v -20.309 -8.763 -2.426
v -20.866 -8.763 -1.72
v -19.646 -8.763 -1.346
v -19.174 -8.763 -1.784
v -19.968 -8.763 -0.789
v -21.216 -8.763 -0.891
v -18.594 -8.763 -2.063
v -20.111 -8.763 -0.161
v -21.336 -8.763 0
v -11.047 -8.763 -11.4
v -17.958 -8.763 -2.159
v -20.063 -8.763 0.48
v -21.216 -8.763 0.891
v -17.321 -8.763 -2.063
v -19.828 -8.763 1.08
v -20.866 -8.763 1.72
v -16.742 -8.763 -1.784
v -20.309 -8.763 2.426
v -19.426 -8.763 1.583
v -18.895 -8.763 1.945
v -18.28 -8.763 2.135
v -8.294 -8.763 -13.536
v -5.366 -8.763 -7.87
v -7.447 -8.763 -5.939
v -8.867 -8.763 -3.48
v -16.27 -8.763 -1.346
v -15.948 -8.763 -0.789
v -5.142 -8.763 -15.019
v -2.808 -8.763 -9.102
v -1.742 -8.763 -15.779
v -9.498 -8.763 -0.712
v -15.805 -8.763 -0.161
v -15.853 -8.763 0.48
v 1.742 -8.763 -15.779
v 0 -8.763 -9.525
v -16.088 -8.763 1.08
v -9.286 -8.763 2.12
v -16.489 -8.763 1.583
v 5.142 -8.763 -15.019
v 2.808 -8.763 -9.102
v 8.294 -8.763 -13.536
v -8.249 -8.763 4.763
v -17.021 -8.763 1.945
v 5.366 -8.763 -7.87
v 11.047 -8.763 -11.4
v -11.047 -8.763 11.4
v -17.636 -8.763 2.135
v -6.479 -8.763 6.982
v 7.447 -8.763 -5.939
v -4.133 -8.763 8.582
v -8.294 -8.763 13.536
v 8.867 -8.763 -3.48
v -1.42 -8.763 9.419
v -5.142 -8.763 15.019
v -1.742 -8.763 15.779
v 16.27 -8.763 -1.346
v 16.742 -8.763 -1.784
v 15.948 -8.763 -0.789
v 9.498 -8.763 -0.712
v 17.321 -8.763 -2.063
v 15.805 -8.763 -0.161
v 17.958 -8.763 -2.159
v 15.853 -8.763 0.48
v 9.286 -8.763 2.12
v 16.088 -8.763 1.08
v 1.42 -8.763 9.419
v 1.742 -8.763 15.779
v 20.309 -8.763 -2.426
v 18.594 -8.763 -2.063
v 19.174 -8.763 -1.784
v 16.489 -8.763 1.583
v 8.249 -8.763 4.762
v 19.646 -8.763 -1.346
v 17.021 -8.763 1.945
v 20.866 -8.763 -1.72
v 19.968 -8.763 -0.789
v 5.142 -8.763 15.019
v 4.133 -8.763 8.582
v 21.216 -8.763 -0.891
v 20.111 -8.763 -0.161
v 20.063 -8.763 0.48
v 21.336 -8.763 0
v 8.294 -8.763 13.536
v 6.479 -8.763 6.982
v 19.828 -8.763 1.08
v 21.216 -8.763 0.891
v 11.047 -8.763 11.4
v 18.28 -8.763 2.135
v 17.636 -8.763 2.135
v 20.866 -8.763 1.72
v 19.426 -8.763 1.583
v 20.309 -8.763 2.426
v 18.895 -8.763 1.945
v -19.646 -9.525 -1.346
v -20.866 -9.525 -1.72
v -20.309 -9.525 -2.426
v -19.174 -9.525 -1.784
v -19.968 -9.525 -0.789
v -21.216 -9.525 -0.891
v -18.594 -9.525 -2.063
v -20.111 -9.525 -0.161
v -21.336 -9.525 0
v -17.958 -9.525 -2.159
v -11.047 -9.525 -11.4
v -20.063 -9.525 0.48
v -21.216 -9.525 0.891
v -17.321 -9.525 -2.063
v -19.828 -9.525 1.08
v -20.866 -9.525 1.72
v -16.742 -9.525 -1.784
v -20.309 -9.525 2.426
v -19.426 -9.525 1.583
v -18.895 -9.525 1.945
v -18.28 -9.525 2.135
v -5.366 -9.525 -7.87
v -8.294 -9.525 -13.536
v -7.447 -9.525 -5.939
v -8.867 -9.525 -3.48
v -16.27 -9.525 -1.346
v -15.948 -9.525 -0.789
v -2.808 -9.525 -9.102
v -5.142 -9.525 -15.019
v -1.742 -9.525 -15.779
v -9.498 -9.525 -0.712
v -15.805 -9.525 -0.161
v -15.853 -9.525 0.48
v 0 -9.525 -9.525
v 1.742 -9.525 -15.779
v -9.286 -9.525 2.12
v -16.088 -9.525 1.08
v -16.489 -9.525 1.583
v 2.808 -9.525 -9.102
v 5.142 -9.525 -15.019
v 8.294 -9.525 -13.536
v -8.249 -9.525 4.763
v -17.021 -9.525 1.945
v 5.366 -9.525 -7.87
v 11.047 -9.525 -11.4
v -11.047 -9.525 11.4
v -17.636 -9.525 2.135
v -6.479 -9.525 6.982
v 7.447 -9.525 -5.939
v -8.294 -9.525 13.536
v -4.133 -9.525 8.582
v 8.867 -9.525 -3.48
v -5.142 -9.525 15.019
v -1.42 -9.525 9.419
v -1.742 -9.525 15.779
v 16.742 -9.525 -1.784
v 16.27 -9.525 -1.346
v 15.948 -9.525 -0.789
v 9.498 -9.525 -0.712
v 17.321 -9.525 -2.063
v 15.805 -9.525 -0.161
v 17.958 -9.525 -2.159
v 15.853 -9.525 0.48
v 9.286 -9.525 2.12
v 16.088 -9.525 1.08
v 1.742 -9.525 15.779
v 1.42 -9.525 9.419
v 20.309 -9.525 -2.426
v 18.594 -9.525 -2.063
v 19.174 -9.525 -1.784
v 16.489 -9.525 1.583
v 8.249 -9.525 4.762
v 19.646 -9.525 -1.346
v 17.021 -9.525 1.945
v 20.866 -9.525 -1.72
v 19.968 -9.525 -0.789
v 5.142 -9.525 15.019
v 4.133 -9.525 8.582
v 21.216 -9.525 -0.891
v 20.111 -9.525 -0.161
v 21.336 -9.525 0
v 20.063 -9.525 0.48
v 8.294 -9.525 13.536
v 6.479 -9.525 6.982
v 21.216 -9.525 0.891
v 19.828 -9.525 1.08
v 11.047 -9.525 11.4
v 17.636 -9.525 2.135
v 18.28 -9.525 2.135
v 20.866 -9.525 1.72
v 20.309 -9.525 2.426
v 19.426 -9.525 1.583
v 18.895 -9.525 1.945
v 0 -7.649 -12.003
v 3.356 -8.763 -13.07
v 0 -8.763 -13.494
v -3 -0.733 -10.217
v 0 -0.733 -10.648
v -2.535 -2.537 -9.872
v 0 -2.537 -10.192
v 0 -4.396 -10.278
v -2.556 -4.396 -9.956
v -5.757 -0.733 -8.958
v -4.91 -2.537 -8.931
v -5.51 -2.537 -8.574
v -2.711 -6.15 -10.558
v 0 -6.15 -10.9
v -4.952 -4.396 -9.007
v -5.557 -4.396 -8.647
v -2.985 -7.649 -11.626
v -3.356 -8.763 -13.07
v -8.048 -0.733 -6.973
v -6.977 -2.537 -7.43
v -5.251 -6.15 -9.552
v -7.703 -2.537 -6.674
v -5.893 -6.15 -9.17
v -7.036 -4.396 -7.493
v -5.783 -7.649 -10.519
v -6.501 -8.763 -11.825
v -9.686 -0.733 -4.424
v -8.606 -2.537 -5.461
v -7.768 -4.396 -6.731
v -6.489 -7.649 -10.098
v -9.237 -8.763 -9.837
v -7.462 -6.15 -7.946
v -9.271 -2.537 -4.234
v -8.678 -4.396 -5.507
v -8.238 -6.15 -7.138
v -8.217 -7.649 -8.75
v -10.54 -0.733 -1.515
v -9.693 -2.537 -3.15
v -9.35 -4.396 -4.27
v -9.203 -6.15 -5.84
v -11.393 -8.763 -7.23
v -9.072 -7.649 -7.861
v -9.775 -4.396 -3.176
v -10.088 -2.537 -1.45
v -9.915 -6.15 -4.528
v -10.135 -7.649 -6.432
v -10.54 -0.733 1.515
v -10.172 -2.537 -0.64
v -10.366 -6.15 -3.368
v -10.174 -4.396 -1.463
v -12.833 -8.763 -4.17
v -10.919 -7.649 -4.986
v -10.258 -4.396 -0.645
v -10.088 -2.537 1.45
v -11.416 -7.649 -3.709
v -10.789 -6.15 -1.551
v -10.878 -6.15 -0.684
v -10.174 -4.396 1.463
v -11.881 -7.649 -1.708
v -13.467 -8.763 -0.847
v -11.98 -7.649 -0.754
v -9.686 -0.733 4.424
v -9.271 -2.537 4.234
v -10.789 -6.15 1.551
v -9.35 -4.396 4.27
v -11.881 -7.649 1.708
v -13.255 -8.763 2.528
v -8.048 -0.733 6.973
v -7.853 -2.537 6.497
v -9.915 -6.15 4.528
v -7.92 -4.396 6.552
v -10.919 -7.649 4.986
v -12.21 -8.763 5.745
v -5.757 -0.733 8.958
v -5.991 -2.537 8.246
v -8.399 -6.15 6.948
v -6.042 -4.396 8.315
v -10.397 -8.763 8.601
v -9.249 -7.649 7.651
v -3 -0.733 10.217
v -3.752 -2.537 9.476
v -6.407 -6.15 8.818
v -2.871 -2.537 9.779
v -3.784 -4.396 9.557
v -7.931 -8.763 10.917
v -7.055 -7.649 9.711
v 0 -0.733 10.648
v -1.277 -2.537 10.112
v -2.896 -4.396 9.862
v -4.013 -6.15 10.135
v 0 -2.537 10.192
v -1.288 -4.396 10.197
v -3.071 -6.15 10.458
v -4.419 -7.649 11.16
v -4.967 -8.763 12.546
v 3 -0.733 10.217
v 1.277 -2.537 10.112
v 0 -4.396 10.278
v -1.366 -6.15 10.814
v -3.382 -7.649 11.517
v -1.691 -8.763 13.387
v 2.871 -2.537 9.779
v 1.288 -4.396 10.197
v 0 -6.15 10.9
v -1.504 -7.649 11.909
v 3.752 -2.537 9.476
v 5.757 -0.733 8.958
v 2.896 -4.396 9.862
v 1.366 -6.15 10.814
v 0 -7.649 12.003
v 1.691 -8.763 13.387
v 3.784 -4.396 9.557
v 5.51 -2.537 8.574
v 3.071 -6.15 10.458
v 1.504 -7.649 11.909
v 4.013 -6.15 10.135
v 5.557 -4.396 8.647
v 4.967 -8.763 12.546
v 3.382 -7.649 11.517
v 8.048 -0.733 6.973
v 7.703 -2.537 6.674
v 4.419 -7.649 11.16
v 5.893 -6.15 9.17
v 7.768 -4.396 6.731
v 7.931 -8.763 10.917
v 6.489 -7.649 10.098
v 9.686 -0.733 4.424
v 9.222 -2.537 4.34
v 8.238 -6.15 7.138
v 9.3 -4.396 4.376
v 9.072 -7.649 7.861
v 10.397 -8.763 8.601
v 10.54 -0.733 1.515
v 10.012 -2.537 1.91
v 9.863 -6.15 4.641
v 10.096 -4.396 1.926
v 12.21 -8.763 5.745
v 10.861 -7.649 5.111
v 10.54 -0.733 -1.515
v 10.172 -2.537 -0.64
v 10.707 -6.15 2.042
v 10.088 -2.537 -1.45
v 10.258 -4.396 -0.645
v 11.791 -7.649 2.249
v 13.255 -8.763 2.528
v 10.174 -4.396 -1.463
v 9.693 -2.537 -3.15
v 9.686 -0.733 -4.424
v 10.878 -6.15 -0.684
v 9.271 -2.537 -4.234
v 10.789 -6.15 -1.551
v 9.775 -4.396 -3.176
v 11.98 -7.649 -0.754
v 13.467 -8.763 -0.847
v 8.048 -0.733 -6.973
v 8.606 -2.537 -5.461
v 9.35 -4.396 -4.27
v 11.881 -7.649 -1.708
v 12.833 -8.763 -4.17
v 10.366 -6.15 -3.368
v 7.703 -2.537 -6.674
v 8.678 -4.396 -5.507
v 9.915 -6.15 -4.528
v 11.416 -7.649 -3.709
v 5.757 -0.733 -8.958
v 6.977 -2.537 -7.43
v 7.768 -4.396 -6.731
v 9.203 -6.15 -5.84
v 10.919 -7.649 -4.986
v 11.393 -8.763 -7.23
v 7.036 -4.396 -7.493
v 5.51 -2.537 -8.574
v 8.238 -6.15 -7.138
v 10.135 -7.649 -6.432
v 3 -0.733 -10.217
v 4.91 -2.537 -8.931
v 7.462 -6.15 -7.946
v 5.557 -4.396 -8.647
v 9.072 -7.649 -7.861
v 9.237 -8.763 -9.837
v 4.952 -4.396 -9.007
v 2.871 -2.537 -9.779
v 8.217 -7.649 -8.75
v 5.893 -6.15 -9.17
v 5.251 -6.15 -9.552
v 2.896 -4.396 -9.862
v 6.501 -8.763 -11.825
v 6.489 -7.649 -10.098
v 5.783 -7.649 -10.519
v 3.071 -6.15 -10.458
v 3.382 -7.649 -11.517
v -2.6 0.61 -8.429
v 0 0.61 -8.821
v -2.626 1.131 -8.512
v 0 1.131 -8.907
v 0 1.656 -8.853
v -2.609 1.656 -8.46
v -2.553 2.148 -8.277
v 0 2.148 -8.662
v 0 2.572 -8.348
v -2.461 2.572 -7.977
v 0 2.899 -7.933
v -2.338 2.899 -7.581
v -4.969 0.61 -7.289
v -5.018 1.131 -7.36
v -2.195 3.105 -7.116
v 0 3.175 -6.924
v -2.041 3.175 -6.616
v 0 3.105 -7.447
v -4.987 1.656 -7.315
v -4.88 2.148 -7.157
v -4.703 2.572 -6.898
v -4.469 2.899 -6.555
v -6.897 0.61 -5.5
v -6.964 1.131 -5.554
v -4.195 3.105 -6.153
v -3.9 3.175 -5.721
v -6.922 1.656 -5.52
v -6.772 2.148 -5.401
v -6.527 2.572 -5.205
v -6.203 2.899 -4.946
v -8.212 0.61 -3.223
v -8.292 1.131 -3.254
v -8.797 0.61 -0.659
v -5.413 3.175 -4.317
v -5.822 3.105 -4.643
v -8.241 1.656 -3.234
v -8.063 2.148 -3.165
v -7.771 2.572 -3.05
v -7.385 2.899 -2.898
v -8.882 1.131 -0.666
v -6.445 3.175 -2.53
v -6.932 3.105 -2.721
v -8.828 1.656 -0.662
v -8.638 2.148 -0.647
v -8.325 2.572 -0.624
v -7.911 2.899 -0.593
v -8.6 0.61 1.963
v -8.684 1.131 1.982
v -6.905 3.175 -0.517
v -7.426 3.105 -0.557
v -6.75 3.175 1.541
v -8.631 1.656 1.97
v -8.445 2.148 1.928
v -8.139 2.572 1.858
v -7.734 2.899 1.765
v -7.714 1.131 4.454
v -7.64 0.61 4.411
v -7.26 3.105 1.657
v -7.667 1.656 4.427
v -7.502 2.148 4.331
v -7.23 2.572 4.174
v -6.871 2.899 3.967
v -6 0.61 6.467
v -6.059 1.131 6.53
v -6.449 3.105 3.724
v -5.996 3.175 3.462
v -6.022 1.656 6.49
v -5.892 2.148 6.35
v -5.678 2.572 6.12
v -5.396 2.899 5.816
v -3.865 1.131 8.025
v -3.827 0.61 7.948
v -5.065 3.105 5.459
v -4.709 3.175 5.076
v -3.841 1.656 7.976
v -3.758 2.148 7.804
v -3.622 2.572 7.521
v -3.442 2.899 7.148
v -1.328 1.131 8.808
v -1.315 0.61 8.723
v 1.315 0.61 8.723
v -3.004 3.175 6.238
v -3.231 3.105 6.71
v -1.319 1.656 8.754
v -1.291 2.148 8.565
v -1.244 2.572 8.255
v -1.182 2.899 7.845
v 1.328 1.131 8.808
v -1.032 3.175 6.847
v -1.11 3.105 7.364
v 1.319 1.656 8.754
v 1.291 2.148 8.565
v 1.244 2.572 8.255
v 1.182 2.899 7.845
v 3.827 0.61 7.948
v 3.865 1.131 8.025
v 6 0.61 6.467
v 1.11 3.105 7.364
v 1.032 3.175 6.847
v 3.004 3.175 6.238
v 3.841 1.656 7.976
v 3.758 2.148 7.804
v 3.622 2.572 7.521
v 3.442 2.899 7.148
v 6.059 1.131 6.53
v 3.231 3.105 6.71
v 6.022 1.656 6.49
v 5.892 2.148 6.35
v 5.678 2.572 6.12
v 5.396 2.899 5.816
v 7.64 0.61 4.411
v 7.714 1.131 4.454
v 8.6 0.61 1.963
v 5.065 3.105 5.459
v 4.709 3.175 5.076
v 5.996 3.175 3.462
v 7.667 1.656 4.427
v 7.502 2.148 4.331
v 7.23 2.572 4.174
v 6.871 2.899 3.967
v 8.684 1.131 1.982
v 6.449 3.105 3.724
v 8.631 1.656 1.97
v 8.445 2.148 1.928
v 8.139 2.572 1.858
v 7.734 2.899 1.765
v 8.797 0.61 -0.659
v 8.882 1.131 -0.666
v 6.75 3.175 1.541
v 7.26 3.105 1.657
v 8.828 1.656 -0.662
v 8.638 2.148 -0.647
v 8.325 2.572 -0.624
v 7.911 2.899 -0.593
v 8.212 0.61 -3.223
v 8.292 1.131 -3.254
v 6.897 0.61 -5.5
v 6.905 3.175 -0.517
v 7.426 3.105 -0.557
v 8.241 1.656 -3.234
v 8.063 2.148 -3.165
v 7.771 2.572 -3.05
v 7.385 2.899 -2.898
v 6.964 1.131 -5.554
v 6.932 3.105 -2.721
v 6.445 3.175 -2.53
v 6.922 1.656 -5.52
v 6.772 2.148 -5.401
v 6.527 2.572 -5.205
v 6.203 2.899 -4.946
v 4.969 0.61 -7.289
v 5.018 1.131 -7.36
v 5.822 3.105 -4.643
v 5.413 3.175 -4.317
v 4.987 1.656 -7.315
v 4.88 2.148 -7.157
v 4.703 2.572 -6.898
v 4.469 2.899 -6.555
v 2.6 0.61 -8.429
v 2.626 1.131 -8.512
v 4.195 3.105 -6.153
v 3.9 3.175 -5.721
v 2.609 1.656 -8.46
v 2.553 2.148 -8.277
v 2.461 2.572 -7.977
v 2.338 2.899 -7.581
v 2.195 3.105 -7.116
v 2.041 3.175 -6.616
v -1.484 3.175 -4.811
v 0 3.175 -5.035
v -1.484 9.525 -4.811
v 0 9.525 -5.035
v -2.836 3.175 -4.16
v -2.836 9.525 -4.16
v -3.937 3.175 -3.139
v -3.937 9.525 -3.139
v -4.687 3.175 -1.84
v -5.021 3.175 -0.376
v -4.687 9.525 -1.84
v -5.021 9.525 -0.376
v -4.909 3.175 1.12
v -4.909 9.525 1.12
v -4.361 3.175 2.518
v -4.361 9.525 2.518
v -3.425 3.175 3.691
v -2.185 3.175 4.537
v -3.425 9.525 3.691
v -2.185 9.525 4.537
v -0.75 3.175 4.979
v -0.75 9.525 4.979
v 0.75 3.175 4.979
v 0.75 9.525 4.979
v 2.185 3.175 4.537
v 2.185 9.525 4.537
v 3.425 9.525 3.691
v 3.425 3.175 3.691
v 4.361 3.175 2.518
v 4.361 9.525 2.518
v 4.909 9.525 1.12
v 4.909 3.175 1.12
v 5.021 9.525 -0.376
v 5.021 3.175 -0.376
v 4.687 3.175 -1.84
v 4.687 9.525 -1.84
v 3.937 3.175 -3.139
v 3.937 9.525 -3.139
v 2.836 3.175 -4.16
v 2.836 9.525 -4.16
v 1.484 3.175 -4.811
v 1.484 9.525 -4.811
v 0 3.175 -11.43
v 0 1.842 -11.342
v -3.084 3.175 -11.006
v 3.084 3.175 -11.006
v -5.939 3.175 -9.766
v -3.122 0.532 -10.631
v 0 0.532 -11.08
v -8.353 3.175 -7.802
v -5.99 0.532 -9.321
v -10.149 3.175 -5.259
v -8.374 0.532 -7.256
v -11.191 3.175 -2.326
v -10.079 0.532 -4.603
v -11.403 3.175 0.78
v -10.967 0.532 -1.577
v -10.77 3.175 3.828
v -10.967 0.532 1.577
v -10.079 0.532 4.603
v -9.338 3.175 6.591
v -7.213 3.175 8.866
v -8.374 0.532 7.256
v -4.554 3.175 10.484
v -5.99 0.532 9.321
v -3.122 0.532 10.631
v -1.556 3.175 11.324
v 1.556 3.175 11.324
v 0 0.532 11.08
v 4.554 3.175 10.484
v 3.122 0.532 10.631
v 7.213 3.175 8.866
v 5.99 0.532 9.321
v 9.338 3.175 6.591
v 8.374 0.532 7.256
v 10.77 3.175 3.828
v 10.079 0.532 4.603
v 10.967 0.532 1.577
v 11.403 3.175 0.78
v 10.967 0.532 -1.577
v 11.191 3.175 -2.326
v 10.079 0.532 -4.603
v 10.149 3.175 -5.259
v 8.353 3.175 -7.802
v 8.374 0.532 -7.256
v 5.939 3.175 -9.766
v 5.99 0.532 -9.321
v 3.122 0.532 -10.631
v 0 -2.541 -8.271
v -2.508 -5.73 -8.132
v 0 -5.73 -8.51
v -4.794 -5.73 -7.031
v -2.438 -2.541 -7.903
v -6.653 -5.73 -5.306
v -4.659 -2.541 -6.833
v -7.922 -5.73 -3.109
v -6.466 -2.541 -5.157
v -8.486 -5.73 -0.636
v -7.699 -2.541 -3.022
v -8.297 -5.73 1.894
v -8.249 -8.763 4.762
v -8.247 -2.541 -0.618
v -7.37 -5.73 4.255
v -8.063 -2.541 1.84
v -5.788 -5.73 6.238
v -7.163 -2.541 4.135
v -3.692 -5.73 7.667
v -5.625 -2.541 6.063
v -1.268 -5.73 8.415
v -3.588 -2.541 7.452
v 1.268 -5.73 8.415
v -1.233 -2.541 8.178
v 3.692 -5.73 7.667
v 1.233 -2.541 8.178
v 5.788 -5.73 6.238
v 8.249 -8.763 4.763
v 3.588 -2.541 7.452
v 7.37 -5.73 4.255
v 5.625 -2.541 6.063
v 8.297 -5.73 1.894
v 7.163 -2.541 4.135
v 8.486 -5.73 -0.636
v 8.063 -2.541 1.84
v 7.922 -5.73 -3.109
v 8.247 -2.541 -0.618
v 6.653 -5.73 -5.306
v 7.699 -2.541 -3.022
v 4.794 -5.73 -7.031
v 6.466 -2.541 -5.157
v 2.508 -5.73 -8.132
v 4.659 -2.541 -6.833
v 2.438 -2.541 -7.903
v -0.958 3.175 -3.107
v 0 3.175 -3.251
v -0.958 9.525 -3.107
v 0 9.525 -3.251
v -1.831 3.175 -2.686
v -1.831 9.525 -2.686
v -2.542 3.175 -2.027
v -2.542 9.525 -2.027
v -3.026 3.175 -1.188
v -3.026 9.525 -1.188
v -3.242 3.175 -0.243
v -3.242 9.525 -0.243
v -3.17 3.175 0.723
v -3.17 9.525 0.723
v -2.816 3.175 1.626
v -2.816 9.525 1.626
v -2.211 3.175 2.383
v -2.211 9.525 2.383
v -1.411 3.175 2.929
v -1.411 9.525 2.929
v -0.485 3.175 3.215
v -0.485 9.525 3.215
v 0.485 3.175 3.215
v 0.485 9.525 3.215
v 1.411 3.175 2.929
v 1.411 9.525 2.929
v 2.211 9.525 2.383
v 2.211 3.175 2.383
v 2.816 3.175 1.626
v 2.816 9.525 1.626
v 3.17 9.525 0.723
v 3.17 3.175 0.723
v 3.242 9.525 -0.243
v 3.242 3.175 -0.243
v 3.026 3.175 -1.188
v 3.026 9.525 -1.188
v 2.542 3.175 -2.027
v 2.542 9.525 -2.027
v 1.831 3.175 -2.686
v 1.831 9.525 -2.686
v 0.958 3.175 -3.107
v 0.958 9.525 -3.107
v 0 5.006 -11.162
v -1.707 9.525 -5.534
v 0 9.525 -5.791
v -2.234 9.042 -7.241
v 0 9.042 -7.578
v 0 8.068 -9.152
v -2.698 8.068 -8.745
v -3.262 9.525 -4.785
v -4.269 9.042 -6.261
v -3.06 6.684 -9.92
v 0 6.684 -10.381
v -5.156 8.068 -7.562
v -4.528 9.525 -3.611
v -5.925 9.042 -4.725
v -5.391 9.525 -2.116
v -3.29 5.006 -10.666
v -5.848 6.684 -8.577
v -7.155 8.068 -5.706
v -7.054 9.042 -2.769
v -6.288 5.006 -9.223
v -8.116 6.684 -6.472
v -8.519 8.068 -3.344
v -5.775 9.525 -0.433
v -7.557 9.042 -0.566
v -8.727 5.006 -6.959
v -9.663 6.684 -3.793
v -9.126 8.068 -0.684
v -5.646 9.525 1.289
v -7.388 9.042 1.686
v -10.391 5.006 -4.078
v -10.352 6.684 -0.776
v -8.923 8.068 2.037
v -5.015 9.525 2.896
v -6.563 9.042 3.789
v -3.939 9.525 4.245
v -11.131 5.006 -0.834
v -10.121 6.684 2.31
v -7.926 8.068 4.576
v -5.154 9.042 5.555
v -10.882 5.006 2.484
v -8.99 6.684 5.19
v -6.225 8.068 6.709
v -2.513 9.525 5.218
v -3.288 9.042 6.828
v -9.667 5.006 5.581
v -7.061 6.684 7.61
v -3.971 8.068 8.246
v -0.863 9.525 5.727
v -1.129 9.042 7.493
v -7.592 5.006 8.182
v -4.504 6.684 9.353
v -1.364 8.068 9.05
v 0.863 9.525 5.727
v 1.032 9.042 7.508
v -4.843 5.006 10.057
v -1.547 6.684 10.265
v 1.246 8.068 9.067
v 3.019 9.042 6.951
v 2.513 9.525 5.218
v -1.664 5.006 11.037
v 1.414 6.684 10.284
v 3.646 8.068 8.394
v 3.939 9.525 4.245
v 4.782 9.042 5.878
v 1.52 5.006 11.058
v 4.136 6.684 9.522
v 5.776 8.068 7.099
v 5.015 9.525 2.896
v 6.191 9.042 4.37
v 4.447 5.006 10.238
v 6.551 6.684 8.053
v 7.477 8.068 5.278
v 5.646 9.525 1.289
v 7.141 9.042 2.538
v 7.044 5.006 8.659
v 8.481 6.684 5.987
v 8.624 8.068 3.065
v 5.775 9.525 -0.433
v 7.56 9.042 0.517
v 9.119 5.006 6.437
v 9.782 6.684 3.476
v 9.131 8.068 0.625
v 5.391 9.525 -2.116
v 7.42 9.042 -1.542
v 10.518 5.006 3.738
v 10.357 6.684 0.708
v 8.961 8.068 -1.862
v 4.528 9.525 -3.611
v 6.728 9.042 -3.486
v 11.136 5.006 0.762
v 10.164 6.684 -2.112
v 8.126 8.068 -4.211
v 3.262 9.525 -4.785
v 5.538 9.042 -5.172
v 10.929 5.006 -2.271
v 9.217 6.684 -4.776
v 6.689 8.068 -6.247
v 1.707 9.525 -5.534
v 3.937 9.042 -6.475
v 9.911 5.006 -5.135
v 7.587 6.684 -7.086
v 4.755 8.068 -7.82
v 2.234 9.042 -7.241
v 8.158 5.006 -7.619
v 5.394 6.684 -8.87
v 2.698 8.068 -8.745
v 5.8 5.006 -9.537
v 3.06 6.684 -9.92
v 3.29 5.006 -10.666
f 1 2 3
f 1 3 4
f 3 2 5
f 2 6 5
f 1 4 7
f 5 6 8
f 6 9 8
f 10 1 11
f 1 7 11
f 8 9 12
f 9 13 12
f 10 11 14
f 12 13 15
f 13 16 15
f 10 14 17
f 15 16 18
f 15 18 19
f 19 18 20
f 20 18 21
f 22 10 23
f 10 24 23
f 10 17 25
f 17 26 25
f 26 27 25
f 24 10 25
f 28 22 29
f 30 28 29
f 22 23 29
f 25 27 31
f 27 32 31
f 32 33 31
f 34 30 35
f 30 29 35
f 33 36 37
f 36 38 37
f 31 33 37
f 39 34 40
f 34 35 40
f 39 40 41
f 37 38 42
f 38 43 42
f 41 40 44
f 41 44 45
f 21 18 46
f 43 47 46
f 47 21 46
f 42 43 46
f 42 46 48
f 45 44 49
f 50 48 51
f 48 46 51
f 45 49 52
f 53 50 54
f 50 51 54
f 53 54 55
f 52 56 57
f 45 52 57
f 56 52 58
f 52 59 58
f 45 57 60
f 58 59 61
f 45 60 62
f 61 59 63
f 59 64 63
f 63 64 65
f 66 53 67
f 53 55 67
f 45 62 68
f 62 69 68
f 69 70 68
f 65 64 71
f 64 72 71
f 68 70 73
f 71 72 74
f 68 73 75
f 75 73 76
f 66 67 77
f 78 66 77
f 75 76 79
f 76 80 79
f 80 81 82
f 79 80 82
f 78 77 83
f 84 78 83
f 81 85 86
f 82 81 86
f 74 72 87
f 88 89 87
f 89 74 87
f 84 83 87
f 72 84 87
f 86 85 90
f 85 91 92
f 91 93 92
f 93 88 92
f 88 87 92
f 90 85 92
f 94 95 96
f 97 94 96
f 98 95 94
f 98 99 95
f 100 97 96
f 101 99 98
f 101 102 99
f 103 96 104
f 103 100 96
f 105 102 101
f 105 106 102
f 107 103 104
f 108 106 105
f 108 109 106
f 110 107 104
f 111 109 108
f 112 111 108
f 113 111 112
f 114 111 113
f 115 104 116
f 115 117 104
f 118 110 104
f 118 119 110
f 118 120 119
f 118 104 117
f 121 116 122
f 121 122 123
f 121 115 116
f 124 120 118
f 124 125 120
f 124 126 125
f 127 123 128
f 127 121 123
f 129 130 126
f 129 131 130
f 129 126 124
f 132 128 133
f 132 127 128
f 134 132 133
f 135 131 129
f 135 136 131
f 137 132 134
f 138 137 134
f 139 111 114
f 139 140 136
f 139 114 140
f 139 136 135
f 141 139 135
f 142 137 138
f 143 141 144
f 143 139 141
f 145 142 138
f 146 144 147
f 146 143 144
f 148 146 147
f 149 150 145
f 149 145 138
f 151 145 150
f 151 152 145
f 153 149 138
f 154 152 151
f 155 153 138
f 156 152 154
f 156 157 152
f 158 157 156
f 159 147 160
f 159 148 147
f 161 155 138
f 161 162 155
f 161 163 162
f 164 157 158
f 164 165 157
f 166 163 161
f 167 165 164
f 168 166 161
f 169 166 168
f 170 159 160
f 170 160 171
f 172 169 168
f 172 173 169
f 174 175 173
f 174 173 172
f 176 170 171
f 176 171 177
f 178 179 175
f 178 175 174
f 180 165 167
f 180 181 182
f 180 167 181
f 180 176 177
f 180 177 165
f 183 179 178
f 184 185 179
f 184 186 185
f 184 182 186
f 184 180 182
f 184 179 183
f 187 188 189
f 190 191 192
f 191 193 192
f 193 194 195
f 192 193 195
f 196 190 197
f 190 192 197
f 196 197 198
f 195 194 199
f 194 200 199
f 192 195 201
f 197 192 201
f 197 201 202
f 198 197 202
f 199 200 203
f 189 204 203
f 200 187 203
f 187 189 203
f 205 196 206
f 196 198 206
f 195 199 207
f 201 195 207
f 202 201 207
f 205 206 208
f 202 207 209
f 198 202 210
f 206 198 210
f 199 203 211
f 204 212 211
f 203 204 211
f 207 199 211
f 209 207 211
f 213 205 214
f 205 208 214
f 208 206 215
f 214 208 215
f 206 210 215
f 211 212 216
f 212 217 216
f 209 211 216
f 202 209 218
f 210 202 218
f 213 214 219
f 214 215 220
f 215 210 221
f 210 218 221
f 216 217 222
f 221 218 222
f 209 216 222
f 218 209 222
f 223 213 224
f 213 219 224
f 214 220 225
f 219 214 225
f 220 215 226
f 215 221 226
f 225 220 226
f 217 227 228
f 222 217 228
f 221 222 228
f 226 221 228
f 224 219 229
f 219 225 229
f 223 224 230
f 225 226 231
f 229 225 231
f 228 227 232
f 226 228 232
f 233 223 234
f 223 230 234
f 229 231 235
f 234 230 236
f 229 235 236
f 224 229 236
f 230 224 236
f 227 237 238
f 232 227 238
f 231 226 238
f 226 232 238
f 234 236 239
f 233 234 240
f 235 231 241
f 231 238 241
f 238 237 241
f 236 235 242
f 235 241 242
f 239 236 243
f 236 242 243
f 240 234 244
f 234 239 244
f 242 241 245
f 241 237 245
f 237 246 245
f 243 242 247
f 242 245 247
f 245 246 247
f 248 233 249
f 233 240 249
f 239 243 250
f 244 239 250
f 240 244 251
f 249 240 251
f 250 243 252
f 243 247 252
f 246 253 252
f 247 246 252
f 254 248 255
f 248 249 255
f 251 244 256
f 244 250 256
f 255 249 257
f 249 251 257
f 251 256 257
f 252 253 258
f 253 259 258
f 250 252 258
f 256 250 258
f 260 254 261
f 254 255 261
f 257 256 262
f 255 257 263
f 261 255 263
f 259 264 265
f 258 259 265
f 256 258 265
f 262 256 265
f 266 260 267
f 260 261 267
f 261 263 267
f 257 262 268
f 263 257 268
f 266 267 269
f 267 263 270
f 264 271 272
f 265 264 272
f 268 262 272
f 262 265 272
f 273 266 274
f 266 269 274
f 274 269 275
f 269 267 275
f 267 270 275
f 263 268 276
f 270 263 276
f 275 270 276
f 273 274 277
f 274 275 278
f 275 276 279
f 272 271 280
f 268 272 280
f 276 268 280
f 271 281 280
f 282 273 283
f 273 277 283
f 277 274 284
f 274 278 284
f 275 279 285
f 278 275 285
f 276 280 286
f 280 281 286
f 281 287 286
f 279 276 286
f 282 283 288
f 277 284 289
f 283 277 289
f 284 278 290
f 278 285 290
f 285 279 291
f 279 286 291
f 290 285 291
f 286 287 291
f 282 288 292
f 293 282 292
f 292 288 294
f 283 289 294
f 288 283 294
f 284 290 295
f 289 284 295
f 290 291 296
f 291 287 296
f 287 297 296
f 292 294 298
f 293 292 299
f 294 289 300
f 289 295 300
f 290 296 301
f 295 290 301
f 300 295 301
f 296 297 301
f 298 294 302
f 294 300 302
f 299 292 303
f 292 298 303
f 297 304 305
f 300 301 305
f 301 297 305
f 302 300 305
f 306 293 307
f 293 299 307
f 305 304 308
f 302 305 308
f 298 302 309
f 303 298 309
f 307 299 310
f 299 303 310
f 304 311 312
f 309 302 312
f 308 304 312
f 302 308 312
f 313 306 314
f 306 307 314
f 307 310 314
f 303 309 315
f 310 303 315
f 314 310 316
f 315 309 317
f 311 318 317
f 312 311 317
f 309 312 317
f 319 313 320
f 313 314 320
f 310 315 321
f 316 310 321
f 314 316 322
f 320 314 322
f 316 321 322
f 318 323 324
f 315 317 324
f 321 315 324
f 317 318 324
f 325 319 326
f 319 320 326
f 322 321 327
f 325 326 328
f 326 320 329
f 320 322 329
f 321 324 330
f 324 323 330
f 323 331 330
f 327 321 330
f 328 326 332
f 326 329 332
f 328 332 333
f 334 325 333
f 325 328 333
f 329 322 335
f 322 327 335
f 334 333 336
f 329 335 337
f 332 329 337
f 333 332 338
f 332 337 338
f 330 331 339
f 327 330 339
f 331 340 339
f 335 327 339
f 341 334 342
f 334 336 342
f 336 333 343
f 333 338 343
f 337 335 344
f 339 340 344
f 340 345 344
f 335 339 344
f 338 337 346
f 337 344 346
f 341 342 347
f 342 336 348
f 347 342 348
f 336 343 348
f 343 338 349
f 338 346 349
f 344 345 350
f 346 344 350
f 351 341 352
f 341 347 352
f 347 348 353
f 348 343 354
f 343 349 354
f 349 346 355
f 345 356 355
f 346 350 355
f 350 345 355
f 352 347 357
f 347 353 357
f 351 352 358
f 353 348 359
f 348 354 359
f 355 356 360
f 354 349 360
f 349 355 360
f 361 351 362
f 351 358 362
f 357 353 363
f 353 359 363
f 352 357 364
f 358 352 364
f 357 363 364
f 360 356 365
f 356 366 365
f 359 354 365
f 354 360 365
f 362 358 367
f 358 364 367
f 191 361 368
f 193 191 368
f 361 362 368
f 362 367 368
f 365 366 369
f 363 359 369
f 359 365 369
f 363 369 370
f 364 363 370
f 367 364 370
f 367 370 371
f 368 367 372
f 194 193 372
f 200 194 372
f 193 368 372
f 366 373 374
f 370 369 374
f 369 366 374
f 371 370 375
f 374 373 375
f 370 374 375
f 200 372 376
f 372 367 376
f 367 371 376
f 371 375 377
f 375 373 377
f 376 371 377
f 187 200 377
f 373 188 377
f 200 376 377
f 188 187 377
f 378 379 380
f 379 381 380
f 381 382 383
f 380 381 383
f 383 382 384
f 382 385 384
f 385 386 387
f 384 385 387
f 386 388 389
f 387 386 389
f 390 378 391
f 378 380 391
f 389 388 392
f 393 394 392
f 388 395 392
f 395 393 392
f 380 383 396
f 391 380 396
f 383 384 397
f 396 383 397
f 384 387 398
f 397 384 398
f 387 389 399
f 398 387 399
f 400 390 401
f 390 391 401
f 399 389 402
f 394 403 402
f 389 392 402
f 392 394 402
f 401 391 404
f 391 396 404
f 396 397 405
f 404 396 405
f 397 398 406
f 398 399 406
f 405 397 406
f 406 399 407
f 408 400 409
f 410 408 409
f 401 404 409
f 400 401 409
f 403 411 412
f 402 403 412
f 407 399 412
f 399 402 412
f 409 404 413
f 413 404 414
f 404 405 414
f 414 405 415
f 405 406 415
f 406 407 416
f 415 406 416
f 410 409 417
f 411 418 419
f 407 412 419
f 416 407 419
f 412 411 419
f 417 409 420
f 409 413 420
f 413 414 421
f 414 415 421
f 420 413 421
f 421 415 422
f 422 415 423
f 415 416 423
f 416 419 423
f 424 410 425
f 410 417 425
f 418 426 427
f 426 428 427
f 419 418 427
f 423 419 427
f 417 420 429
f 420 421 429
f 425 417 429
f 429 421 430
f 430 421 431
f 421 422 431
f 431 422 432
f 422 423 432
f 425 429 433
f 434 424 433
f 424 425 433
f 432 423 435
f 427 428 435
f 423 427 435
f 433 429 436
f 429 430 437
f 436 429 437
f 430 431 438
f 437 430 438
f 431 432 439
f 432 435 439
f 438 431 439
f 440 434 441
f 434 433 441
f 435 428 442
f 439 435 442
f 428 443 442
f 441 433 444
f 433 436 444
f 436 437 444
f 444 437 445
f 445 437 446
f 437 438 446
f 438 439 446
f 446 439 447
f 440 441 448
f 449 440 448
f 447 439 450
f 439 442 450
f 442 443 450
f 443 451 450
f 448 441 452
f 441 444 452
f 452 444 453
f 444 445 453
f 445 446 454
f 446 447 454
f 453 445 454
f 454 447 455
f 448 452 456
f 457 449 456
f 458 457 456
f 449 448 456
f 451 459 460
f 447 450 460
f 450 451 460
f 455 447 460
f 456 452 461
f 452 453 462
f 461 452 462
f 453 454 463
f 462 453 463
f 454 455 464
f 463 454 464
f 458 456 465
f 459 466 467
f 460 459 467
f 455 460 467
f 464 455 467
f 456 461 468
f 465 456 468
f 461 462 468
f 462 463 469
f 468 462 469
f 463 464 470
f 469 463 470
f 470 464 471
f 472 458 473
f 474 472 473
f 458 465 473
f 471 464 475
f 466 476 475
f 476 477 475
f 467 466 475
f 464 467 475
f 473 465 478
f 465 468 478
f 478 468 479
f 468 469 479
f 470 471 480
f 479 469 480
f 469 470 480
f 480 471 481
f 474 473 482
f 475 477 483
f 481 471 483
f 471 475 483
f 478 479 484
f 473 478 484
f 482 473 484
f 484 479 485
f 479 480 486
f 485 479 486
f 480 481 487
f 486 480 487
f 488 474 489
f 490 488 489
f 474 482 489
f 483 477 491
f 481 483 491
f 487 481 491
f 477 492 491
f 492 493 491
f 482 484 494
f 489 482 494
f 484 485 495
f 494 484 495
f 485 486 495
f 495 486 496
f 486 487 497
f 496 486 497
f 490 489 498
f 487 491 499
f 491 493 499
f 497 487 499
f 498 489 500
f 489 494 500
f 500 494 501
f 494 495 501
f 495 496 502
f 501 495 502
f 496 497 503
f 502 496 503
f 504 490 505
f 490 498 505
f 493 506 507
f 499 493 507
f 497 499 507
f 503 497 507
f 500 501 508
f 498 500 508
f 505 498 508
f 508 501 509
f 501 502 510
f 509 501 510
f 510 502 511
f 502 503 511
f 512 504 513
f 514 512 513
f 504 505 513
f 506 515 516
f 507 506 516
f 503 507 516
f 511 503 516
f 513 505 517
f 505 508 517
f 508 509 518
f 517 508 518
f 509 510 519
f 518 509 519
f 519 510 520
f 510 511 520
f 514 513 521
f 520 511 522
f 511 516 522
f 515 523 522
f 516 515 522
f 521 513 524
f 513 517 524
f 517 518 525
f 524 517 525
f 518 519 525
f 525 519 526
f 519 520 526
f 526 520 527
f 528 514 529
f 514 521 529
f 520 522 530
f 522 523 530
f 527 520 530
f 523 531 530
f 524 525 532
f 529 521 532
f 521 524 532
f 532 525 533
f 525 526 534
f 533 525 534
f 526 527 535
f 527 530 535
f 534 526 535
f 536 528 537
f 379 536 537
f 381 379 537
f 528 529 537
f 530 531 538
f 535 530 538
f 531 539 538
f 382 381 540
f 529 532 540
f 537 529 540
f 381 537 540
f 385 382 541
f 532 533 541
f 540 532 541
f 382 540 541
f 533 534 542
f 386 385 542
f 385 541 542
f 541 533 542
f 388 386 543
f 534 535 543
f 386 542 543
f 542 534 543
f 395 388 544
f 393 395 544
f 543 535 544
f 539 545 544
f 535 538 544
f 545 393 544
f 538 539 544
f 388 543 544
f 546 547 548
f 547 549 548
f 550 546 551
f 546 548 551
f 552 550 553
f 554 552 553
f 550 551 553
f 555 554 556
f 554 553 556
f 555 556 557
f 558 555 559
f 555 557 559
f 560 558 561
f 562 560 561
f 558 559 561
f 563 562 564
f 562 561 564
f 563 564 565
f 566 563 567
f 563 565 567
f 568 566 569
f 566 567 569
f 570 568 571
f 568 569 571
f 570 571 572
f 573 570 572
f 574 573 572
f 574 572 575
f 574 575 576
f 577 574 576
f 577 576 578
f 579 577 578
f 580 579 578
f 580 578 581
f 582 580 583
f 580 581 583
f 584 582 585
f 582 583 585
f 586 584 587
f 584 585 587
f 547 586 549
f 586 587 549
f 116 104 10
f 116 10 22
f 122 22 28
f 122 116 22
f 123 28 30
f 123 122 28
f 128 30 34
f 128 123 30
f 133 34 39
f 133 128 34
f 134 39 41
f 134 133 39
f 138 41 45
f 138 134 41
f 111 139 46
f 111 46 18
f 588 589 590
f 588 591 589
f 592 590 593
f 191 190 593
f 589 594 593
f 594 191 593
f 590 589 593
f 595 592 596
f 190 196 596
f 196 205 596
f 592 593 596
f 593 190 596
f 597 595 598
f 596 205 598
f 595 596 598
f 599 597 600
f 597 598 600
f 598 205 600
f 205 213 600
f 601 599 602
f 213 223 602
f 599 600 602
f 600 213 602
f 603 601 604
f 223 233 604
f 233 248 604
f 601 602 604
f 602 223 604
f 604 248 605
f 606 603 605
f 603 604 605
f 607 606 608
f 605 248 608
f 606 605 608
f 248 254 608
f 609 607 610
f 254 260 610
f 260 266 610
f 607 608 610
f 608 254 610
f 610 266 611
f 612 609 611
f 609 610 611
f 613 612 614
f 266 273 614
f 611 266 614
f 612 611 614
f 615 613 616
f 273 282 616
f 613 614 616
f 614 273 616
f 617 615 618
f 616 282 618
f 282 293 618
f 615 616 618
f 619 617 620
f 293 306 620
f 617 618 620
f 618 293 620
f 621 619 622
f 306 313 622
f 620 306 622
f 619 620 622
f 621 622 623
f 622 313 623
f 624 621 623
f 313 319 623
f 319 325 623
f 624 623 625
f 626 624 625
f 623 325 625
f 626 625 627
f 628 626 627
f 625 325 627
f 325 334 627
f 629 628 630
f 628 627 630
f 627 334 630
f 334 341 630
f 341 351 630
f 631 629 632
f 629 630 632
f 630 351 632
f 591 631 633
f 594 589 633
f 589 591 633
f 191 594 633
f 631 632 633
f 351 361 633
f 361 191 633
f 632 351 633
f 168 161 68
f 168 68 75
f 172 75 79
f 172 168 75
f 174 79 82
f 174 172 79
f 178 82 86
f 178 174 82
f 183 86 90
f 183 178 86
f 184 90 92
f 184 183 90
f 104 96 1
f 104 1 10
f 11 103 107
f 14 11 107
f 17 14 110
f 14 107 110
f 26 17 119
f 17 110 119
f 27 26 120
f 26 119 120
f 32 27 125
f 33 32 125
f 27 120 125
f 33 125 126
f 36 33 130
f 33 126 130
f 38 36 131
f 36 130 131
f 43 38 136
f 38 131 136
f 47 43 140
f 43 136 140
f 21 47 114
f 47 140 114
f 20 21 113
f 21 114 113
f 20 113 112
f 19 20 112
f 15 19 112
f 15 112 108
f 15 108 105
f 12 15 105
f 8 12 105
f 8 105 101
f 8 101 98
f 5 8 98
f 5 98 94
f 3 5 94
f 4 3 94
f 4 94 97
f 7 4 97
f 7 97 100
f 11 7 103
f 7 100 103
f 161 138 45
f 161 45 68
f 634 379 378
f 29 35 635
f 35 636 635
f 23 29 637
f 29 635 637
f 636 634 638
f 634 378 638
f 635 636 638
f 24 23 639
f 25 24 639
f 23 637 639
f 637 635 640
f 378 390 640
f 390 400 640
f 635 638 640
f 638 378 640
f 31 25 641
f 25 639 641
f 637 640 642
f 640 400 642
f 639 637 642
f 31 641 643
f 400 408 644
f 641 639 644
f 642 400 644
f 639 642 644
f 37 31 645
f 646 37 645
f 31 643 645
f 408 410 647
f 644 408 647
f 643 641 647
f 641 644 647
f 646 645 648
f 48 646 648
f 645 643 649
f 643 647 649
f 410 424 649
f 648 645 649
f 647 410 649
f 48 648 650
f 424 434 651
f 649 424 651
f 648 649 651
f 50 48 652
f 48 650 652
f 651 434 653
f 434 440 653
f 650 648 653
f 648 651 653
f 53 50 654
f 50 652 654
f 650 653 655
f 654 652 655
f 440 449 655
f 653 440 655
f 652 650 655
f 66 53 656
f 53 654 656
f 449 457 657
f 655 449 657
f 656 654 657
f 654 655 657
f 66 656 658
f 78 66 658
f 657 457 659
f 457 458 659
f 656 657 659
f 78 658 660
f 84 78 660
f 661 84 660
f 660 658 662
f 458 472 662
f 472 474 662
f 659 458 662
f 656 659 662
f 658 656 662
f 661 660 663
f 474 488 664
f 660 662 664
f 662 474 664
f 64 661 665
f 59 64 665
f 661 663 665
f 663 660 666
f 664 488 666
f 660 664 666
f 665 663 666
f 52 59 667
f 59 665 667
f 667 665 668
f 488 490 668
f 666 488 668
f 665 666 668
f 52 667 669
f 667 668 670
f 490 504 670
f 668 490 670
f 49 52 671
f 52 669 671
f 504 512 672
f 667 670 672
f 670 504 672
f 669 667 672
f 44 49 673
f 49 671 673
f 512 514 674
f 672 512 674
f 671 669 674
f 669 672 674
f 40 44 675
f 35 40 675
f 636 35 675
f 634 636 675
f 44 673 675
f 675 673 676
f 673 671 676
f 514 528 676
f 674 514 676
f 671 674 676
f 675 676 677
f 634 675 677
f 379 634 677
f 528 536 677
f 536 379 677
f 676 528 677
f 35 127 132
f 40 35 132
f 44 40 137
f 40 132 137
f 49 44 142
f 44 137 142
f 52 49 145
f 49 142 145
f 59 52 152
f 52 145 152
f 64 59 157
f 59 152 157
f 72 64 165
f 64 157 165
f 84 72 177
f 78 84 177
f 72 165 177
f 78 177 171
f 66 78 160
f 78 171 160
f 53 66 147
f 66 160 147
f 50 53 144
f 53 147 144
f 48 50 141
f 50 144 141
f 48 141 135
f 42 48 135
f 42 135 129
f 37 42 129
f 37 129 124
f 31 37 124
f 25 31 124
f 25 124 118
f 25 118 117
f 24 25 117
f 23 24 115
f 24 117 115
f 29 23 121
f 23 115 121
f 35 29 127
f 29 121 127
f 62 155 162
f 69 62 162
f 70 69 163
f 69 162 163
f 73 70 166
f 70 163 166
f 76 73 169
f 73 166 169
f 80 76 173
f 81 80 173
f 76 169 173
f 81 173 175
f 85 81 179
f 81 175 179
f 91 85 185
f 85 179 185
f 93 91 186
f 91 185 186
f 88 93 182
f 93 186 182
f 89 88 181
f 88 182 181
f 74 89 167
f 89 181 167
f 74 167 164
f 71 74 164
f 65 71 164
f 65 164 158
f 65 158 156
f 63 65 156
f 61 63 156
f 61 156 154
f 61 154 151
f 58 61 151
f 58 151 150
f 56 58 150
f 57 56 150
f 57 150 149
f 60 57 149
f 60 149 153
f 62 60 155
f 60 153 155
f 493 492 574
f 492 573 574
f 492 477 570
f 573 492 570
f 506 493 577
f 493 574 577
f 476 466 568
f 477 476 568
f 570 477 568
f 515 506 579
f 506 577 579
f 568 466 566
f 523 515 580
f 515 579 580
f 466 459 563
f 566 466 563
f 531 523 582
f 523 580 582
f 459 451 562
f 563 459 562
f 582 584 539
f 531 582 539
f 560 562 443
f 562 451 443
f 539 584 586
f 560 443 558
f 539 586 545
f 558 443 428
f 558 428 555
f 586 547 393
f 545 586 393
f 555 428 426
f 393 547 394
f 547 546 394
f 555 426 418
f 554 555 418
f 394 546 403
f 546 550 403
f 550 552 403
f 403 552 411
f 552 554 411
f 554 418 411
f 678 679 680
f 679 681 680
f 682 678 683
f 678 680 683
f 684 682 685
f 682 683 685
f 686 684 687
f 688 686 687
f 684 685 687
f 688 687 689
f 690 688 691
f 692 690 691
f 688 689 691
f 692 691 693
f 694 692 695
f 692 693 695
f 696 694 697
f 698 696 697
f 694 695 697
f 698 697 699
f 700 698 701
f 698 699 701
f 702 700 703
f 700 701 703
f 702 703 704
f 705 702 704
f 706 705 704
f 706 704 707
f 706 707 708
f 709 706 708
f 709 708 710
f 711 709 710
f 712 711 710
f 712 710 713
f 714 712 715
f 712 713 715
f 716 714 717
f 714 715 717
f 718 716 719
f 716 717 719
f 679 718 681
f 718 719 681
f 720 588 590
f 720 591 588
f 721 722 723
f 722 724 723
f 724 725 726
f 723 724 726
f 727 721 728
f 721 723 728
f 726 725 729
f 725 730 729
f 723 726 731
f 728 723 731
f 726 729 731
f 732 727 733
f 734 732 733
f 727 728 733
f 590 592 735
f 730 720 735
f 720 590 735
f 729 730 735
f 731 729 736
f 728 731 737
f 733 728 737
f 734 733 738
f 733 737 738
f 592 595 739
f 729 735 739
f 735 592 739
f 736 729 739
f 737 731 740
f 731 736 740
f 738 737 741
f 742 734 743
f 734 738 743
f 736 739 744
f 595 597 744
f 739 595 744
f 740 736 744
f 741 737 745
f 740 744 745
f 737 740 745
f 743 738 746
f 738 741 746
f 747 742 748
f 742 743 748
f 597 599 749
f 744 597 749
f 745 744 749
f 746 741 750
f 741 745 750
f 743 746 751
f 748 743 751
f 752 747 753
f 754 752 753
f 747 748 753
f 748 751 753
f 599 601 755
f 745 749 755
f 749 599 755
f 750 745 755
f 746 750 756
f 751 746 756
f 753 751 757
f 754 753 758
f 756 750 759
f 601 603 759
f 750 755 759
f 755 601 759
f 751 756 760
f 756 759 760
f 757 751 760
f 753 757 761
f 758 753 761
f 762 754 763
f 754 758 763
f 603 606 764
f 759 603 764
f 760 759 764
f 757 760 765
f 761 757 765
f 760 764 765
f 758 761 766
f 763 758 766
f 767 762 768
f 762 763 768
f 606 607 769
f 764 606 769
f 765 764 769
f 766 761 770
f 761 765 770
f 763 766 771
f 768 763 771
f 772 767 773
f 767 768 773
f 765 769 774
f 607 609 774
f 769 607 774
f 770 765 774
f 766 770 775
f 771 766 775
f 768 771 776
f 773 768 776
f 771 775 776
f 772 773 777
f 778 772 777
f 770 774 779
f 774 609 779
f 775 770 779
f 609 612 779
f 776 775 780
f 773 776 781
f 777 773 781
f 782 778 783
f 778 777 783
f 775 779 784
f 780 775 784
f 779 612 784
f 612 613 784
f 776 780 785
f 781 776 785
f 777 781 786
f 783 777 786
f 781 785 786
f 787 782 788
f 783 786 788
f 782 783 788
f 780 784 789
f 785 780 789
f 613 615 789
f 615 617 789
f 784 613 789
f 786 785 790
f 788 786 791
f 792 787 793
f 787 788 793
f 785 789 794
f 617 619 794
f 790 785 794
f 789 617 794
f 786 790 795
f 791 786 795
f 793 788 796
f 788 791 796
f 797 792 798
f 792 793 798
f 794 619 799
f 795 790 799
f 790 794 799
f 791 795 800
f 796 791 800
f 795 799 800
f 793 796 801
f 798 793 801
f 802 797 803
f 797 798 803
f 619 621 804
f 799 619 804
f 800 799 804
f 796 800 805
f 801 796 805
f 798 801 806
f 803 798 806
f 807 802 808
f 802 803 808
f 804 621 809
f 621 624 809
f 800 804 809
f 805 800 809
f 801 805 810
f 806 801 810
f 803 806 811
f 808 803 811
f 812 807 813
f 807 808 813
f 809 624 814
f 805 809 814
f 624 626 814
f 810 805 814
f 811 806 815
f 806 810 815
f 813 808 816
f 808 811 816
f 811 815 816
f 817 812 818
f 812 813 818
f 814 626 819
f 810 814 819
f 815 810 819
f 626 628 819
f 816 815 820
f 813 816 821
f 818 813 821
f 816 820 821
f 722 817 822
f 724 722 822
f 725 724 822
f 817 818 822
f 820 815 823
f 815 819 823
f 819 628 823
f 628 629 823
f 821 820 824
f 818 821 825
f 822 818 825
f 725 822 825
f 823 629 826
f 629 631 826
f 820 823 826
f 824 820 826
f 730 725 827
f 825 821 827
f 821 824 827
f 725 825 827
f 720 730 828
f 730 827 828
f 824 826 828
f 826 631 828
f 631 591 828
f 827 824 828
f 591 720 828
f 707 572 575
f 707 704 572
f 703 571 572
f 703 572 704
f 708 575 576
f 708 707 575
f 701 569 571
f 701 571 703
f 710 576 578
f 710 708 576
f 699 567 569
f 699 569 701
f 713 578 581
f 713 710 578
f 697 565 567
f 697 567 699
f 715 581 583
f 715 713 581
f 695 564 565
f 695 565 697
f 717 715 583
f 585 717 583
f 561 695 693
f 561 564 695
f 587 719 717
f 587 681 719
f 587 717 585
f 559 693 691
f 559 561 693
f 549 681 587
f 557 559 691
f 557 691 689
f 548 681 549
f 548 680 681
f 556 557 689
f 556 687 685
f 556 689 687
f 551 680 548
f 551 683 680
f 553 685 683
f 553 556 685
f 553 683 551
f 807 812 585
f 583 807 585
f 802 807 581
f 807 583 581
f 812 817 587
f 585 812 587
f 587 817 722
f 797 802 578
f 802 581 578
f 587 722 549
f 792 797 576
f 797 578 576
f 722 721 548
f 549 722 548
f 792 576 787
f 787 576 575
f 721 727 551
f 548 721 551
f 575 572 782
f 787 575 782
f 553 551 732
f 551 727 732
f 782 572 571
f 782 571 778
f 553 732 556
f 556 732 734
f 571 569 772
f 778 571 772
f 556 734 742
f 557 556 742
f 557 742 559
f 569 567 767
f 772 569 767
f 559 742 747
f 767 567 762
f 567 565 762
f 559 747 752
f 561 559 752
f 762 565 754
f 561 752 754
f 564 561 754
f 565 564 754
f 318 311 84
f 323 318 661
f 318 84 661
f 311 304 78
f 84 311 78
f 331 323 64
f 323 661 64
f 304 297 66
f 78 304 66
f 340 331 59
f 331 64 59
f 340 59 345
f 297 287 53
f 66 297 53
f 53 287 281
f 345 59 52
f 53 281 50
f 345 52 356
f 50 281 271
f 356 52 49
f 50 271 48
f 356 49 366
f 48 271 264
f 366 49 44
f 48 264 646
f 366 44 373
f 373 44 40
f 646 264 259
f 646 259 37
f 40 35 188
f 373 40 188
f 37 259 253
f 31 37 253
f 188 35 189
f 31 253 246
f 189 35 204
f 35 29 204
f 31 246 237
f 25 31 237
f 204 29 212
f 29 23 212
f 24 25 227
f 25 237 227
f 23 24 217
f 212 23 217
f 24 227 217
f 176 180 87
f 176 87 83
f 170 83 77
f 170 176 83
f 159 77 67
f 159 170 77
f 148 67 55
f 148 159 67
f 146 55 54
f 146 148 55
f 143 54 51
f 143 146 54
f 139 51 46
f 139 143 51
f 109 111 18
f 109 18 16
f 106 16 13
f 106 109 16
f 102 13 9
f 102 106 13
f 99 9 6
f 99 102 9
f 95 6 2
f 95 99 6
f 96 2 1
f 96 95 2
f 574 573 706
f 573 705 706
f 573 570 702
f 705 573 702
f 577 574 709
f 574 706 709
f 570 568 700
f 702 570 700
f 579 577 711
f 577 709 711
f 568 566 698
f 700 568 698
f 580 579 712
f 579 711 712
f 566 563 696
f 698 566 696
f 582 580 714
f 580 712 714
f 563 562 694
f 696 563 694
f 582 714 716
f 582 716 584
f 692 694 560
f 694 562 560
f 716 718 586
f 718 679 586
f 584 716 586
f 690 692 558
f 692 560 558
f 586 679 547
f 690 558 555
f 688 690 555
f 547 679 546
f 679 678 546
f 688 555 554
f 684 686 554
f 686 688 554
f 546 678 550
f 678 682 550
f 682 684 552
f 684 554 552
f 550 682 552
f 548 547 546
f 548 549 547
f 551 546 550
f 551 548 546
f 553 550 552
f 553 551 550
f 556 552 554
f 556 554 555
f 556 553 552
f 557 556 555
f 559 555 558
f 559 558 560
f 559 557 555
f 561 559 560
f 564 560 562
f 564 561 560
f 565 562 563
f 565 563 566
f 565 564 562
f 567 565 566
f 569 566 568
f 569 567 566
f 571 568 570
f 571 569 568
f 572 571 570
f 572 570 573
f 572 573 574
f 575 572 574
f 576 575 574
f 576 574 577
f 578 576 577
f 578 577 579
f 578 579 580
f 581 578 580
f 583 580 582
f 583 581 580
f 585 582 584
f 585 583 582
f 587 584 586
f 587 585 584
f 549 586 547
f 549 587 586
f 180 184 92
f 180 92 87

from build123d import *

# Parameters (mm, degrees)
SKETCH3_W           = 1.78394955
SKETCH3_H           = 6.35
BOSS_EXTRUDE1_START = 9.525
SKETCH4_R           = 2.159
SKETCH4_R_2         = 9.525
BOSS_EXTRUDE1_DEPTH = 0.762


with BuildPart() as part:
    # Sketch2 → Revolve1 (revolve)
    with BuildSketch(Plane.XY, mode=Mode.PRIVATE) as revolve1_sk:
        with BuildLine():
            Line((-13.49375, -8.763), (-9.525, -8.763))
            ThreePointArc((-9.525, -8.763), (-8.291277851, -4.142846868), (-8.82137527, 0.60971897))
            ThreePointArc((-8.82137527, 0.60971897), (-8.519312402, 2.370669223), (-6.923931641, 3.175))
            Line((-6.923931641, 3.175), (-5.03514955, 3.175))
            Line((-5.03514955, 3.175), (-5.03514955, 9.525))
            Line((-5.03514955, 9.525), (-5.7912, 9.525))
            ThreePointArc((-5.7912, 9.525), (-9.816830313, 7.421132518), (-11.43, 3.175))
            ThreePointArc((-11.43, 3.175), (-11.232702601, 1.182489718), (-10.648473168, -0.732634158))
            ThreePointArc((-10.648473168, -0.732634158), (-10.524604723, -5.295767226), (-13.49375, -8.763))
        make_face()
    revolve(revolve1_sk.sketch.rotate(Axis((0, -9.525, 0), (0, 1, 0)), 270), axis=Axis((0, -9.525, 0), (0, 1, 0)))


with BuildPart() as body_2:
    # Sketch3 → Revolve2 (revolve)
    with BuildSketch(Plane.XY, mode=Mode.PRIVATE) as revolve2_sk:
        with Locations((-4.143174775, 6.35)):
            Rectangle(SKETCH3_W, SKETCH3_H)
    revolve(revolve2_sk.sketch.rotate(Axis((0, -9.525, 0), (0, 1, 0)), 270), axis=Axis((0, -9.525, 0), (0, 1, 0)))


with BuildPart() as body_3:
    # Sketch4 → Boss-Extrude1 (new body)
    with BuildSketch(Plane.XZ.offset(BOSS_EXTRUDE1_START)):
        with BuildLine():
            Line((-20.308683168, -2.42602217), (-11.04738331, -11.400480122))
            ThreePointArc((-11.04738331, -11.400480122), (0, -15.875), (11.04738331, -11.400480122))
            Line((11.04738331, -11.400480122), (20.308683168, -2.42602217))
            ThreePointArc((20.308683168, -2.42602217), (21.336, 0), (20.308683168, 2.42602217))
            Line((20.308683168, 2.42602217), (11.04738331, 11.400480122))
            ThreePointArc((11.04738331, 11.400480122), (0, 15.875), (-11.04738331, 11.400480122))
            Line((-11.04738331, 11.400480122), (-20.308683168, 2.42602217))
            ThreePointArc((-20.308683168, 2.42602217), (-21.336, 0), (-20.308683168, -2.42602217))
        make_face()
        with Locations(Location((-17.9578, 0, 0), (0, 0, 270))):
            Circle(SKETCH4_R, mode=Mode.SUBTRACT)
        with Locations(Location((17.9578, 0, 0), (0, 0, 270))):
            Circle(SKETCH4_R, mode=Mode.SUBTRACT)
        with Locations(Location((0, 0, 0), (0, 0, 270))):
            Circle(SKETCH4_R_2, mode=Mode.SUBTRACT)
    extrude(amount=-BOSS_EXTRUDE1_DEPTH)


solid = Compound([part.part, body_2.part, body_3.part])
